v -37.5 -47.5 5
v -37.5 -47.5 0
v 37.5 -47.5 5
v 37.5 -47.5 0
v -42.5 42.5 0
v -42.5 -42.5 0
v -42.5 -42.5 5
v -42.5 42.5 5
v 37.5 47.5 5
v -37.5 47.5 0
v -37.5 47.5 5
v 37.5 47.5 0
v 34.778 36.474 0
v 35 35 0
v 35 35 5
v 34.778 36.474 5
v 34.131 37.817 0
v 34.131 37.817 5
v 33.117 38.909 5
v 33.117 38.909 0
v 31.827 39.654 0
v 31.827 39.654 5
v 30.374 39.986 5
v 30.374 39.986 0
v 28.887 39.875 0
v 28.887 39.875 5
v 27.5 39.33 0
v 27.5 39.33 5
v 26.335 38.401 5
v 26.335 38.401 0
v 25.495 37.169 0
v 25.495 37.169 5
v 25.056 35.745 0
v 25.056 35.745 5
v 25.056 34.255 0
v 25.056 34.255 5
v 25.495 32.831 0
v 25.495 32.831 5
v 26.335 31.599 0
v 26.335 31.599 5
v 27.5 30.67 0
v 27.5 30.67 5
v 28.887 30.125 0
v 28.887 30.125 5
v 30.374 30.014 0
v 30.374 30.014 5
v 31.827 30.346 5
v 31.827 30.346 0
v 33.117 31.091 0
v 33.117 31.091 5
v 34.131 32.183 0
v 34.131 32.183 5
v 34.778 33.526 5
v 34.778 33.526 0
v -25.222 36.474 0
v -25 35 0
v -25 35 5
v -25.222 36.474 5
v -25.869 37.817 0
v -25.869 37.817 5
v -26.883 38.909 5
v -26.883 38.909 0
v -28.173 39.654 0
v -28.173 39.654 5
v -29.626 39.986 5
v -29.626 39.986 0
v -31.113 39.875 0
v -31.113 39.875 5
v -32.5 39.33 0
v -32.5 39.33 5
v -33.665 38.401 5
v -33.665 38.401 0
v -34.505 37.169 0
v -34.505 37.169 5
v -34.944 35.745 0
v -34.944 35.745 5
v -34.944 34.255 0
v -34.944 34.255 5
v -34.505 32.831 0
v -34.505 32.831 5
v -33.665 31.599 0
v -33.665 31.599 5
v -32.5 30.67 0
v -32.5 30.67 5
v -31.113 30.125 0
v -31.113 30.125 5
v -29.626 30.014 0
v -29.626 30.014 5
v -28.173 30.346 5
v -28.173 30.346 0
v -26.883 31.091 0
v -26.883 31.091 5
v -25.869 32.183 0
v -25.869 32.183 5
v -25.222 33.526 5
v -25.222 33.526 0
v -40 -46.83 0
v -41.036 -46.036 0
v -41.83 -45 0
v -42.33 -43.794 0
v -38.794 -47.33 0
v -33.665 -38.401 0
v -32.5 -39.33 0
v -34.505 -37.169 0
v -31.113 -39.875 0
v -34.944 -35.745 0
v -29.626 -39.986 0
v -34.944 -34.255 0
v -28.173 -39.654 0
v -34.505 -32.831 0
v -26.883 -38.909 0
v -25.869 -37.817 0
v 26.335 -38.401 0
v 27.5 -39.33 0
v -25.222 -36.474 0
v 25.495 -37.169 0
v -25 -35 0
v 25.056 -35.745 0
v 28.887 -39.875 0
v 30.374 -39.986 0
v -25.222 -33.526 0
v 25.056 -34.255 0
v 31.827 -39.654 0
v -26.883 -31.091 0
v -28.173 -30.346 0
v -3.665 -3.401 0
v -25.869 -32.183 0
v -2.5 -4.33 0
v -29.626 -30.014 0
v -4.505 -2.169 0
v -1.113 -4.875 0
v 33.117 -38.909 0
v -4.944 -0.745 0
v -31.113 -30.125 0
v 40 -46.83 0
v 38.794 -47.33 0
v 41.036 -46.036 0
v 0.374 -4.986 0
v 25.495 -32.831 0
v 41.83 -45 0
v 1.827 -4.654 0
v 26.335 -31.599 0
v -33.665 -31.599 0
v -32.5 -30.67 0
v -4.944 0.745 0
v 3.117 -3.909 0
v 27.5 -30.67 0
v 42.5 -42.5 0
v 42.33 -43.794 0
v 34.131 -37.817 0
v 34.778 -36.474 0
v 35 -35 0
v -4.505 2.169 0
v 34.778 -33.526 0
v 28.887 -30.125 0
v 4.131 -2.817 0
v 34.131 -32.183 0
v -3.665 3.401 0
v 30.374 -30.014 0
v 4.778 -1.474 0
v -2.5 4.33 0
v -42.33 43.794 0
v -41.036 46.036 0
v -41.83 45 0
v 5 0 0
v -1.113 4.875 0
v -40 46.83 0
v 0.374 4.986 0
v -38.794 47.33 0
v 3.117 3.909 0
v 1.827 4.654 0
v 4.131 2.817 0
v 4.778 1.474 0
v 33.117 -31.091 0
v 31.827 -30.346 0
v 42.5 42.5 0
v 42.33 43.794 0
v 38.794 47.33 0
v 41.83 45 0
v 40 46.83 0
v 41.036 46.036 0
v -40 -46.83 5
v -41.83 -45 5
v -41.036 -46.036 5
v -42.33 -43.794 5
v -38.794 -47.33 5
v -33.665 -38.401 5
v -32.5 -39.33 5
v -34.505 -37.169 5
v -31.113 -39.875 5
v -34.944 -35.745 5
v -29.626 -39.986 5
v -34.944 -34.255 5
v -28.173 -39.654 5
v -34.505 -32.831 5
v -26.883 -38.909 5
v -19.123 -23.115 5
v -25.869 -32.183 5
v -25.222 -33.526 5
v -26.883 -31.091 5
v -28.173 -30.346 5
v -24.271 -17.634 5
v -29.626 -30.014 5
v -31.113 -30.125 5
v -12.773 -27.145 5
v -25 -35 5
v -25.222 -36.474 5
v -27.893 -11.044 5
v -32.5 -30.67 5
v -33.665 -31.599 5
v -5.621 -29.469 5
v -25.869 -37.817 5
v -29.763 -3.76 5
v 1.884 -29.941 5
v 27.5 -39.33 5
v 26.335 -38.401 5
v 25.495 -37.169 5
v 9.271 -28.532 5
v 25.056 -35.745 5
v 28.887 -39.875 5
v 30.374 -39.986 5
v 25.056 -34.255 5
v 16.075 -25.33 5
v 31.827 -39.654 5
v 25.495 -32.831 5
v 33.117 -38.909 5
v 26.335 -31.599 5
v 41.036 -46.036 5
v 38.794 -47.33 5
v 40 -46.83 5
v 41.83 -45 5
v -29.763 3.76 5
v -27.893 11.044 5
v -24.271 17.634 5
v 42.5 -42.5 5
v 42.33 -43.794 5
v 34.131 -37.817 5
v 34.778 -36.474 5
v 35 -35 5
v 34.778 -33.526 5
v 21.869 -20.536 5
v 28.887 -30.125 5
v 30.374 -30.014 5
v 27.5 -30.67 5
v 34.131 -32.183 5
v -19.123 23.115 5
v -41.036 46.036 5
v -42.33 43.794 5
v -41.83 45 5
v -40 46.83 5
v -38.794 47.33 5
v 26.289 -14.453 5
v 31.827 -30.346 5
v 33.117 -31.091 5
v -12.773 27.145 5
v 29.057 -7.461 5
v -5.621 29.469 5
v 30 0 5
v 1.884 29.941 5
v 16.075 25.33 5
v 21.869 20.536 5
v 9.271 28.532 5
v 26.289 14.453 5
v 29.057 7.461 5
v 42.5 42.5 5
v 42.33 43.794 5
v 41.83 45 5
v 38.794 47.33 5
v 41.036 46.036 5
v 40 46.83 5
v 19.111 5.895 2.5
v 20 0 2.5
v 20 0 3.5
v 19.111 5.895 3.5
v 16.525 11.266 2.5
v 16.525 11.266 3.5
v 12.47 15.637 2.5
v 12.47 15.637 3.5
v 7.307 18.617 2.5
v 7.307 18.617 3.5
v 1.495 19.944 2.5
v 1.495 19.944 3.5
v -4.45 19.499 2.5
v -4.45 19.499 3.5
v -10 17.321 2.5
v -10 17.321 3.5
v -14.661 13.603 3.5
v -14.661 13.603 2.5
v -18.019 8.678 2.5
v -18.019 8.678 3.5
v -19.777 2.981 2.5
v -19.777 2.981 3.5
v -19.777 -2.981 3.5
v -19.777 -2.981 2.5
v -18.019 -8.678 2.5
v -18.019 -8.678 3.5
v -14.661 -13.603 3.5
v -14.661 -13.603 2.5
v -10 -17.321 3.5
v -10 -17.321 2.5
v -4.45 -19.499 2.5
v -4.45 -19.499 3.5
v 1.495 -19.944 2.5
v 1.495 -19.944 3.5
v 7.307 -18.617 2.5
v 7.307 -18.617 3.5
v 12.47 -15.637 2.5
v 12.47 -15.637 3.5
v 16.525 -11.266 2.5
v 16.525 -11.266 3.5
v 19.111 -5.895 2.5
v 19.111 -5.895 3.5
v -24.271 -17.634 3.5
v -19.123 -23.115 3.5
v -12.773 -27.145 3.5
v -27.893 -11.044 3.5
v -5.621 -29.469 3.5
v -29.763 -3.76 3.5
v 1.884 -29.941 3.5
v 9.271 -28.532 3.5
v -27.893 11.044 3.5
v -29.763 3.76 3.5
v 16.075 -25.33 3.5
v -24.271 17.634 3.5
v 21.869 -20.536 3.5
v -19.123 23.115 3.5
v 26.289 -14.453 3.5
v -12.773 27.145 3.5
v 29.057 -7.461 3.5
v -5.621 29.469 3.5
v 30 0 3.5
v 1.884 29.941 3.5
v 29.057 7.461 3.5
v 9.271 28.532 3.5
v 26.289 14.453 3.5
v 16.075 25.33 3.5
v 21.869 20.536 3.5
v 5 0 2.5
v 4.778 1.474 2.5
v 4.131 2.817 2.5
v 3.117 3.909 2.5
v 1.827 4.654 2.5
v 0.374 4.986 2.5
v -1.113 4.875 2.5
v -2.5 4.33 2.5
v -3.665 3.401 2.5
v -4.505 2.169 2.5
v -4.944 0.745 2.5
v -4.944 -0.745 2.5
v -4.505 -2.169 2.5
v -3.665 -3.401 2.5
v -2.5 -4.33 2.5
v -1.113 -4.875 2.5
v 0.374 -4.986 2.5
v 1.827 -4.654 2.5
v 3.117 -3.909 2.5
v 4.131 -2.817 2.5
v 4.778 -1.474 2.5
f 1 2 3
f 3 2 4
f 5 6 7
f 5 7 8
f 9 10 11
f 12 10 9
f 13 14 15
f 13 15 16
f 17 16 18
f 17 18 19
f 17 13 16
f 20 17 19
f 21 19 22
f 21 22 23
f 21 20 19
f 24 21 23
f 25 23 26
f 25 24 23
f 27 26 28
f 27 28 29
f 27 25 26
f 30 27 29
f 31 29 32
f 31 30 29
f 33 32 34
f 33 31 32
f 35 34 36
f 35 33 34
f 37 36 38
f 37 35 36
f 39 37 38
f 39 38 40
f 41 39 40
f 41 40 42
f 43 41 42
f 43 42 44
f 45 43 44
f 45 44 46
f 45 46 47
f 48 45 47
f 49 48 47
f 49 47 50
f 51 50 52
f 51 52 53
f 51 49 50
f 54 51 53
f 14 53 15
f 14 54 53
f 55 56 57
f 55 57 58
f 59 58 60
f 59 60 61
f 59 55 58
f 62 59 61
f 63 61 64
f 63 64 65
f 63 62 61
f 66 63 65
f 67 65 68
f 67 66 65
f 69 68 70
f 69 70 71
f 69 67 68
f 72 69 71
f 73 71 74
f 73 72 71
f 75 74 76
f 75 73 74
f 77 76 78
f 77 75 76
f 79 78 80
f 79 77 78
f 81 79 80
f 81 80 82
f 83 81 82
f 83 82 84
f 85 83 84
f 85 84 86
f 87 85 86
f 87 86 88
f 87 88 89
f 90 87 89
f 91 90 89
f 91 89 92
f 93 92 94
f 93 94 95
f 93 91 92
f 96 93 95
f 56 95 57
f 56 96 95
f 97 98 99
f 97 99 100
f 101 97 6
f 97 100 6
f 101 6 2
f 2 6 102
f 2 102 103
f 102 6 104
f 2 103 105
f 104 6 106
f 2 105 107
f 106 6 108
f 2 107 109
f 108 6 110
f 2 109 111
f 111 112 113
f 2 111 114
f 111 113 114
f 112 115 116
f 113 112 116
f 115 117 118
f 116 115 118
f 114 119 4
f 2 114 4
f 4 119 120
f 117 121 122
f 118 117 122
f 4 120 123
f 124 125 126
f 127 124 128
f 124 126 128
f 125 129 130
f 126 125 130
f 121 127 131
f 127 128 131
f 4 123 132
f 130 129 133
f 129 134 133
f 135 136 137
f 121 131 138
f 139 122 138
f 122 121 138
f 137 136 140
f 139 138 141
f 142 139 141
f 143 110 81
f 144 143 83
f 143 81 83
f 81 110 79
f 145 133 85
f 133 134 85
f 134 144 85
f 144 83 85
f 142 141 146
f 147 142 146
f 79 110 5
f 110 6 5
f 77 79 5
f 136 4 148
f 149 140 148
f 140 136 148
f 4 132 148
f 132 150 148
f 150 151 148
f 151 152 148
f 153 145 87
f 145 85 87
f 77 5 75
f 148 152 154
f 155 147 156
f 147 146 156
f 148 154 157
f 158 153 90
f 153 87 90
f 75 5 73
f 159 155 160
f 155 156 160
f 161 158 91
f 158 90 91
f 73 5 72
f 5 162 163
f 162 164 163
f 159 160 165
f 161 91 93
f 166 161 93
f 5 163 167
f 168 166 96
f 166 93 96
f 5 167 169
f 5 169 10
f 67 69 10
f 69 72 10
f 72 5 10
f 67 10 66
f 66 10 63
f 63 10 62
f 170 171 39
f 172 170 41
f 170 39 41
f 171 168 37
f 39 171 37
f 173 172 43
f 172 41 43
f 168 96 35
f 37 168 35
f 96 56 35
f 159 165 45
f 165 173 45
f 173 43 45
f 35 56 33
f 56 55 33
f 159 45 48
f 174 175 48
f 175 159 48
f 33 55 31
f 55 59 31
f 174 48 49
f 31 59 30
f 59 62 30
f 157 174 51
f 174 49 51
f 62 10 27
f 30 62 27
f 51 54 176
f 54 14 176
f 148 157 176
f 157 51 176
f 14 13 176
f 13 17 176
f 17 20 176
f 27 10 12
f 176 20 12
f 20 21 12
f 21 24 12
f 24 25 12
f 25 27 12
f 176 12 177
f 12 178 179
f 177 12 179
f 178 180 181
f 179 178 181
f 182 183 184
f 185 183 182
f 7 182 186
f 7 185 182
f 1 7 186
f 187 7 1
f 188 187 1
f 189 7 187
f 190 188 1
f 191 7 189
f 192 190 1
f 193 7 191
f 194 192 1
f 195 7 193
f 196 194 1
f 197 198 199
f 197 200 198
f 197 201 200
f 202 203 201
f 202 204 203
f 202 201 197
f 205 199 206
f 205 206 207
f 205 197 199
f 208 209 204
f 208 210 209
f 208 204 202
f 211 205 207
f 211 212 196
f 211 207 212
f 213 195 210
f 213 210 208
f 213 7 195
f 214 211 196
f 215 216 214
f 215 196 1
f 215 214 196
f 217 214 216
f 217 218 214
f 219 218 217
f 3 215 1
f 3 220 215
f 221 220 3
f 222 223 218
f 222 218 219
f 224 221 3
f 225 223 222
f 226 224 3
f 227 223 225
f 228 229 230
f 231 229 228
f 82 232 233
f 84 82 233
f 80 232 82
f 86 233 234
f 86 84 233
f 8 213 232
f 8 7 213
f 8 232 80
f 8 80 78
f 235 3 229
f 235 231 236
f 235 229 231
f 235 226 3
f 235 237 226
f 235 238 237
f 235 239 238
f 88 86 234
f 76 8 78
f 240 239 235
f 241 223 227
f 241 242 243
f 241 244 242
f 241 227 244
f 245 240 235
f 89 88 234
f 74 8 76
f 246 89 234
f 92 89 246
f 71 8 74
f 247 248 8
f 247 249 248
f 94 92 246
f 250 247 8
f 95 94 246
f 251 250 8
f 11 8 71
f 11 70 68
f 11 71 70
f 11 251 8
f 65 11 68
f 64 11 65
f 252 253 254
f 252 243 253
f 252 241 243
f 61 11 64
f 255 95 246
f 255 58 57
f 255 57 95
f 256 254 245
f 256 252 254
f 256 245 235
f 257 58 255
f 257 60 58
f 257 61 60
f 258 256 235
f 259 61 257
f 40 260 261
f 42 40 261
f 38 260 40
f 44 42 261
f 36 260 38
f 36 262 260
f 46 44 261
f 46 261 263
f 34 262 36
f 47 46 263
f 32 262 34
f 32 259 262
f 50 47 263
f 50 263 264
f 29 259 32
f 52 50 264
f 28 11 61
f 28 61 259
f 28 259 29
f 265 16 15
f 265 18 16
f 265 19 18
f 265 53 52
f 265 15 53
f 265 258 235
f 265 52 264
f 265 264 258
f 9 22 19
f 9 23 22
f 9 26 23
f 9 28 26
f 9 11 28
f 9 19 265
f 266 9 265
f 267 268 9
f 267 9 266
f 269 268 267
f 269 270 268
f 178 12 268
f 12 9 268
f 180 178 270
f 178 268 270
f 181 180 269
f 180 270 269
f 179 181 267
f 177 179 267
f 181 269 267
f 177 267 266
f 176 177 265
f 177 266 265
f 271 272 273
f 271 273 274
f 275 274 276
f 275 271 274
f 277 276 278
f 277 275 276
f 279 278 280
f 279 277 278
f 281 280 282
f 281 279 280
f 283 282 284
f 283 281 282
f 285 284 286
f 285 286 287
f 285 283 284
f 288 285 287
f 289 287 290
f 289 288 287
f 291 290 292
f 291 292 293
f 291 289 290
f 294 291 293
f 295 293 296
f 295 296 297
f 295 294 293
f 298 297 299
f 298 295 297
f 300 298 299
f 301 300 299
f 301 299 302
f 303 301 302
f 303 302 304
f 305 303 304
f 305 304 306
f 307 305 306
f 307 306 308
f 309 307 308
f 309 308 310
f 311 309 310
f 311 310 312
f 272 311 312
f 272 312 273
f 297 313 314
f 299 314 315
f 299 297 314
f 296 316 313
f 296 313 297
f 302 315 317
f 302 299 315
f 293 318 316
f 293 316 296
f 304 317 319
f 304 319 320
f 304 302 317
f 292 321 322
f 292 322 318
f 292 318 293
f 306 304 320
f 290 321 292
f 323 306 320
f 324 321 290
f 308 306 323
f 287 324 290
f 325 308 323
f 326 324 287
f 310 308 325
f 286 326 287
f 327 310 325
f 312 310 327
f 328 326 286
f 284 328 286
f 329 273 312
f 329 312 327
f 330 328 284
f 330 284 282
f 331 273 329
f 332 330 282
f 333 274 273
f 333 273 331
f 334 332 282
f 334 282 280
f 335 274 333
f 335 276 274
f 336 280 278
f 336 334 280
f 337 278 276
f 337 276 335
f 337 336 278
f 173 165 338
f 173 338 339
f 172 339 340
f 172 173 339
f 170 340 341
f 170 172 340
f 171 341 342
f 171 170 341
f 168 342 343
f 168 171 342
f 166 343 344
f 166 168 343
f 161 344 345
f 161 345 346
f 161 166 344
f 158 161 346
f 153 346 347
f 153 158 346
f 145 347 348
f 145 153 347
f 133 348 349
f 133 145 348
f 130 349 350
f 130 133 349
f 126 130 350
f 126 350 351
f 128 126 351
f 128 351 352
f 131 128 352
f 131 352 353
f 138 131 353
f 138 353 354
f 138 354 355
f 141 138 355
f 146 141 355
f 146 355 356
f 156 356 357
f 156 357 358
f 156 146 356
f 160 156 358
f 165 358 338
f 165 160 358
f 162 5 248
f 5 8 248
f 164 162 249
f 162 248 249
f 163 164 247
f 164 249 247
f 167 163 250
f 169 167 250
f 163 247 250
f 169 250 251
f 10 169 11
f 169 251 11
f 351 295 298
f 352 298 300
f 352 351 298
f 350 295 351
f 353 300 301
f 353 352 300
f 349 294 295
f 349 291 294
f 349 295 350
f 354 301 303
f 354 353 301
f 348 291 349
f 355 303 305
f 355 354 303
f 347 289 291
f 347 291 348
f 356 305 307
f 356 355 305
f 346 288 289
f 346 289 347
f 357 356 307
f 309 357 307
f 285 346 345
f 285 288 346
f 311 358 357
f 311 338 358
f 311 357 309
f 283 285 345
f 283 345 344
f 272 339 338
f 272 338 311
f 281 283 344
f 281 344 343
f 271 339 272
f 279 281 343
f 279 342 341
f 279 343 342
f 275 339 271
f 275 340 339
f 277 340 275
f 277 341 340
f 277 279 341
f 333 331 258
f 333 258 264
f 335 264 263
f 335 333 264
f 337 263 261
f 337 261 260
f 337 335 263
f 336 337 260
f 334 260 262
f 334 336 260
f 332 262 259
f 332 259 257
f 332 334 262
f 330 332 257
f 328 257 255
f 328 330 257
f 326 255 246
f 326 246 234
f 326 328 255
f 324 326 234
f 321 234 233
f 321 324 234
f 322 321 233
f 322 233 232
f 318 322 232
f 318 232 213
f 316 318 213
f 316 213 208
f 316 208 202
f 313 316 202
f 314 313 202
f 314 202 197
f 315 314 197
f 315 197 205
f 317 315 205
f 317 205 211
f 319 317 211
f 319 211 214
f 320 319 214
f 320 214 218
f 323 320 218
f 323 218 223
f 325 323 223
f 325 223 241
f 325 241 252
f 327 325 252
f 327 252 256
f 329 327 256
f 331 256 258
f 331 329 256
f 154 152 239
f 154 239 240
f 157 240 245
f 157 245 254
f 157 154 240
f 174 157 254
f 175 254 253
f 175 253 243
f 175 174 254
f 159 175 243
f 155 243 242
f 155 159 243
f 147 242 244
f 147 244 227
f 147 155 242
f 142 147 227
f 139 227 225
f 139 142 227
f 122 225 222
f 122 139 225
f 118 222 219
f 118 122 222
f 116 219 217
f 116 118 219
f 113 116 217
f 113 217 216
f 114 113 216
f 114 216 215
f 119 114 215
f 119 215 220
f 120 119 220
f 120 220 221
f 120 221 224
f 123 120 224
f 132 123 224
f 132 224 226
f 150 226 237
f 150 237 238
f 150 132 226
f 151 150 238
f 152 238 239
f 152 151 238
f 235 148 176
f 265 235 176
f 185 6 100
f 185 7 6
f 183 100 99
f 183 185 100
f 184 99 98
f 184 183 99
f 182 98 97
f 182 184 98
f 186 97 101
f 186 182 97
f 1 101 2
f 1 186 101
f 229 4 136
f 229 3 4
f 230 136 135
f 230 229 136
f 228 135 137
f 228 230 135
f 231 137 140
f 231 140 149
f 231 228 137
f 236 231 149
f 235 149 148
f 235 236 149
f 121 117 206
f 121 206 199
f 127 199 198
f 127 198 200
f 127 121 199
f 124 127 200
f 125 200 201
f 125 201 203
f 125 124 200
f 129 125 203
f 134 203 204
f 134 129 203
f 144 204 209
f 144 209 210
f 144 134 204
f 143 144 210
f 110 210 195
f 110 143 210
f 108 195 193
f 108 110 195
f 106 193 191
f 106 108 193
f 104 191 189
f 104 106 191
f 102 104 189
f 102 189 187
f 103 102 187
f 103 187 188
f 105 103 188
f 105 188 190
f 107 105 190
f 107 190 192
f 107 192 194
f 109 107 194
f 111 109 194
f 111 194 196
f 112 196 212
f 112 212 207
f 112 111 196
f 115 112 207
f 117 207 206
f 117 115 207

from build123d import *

# Parameters (mm, degrees)
F0_W     = 85
F0_H     = 95
F0_R     = 5
F0_R_2   = 30
F1_DEPTH = 5
F0_R_3   = 20
F2_DEPTH = 2.5
F3_DEPTH = 3.5
F4_R     = 5


with BuildPart() as f1:
    # F0 (on Top) → F1 (new body)
    with BuildSketch(Plane.XY):
        Rectangle(F0_W, F0_H)
        with Locations((-30, -35)):
            Circle(F0_R, mode=Mode.SUBTRACT)
        with Locations((30, -35)):
            Circle(F0_R, mode=Mode.SUBTRACT)
        with Locations((-30, 35)):
            Circle(F0_R, mode=Mode.SUBTRACT)
        Circle(F0_R_2, mode=Mode.SUBTRACT)
        with Locations((30, 35)):
            Circle(F0_R, mode=Mode.SUBTRACT)
    extrude(amount=F1_DEPTH)

    # F0 (on Top) → F2 (join)
    with BuildSketch(Plane.XY):
        Circle(F0_R_2)
        Circle(F0_R_3, mode=Mode.SUBTRACT)
        Circle(F0_R_3)
        Circle(F0_R, mode=Mode.SUBTRACT)
    extrude(amount=F2_DEPTH)

    # F0 (on Top) → F3 (join)
    with BuildSketch(Plane.XY):
        Circle(F0_R_2)
        Circle(F0_R_3, mode=Mode.SUBTRACT)
    extrude(amount=F3_DEPTH)

    # F4
    f4_edges = [f1.edges().sort_by_distance(p)[0] for p in [
        (-42.5, -47.5, 2.5),
        (42.5, -47.5, 2.5),
        (42.5, 47.5, 2.5),
        (-42.5, 47.5, 2.5),
    ]]
    fillet(f4_edges, radius=F4_R)


solid = f1.part
